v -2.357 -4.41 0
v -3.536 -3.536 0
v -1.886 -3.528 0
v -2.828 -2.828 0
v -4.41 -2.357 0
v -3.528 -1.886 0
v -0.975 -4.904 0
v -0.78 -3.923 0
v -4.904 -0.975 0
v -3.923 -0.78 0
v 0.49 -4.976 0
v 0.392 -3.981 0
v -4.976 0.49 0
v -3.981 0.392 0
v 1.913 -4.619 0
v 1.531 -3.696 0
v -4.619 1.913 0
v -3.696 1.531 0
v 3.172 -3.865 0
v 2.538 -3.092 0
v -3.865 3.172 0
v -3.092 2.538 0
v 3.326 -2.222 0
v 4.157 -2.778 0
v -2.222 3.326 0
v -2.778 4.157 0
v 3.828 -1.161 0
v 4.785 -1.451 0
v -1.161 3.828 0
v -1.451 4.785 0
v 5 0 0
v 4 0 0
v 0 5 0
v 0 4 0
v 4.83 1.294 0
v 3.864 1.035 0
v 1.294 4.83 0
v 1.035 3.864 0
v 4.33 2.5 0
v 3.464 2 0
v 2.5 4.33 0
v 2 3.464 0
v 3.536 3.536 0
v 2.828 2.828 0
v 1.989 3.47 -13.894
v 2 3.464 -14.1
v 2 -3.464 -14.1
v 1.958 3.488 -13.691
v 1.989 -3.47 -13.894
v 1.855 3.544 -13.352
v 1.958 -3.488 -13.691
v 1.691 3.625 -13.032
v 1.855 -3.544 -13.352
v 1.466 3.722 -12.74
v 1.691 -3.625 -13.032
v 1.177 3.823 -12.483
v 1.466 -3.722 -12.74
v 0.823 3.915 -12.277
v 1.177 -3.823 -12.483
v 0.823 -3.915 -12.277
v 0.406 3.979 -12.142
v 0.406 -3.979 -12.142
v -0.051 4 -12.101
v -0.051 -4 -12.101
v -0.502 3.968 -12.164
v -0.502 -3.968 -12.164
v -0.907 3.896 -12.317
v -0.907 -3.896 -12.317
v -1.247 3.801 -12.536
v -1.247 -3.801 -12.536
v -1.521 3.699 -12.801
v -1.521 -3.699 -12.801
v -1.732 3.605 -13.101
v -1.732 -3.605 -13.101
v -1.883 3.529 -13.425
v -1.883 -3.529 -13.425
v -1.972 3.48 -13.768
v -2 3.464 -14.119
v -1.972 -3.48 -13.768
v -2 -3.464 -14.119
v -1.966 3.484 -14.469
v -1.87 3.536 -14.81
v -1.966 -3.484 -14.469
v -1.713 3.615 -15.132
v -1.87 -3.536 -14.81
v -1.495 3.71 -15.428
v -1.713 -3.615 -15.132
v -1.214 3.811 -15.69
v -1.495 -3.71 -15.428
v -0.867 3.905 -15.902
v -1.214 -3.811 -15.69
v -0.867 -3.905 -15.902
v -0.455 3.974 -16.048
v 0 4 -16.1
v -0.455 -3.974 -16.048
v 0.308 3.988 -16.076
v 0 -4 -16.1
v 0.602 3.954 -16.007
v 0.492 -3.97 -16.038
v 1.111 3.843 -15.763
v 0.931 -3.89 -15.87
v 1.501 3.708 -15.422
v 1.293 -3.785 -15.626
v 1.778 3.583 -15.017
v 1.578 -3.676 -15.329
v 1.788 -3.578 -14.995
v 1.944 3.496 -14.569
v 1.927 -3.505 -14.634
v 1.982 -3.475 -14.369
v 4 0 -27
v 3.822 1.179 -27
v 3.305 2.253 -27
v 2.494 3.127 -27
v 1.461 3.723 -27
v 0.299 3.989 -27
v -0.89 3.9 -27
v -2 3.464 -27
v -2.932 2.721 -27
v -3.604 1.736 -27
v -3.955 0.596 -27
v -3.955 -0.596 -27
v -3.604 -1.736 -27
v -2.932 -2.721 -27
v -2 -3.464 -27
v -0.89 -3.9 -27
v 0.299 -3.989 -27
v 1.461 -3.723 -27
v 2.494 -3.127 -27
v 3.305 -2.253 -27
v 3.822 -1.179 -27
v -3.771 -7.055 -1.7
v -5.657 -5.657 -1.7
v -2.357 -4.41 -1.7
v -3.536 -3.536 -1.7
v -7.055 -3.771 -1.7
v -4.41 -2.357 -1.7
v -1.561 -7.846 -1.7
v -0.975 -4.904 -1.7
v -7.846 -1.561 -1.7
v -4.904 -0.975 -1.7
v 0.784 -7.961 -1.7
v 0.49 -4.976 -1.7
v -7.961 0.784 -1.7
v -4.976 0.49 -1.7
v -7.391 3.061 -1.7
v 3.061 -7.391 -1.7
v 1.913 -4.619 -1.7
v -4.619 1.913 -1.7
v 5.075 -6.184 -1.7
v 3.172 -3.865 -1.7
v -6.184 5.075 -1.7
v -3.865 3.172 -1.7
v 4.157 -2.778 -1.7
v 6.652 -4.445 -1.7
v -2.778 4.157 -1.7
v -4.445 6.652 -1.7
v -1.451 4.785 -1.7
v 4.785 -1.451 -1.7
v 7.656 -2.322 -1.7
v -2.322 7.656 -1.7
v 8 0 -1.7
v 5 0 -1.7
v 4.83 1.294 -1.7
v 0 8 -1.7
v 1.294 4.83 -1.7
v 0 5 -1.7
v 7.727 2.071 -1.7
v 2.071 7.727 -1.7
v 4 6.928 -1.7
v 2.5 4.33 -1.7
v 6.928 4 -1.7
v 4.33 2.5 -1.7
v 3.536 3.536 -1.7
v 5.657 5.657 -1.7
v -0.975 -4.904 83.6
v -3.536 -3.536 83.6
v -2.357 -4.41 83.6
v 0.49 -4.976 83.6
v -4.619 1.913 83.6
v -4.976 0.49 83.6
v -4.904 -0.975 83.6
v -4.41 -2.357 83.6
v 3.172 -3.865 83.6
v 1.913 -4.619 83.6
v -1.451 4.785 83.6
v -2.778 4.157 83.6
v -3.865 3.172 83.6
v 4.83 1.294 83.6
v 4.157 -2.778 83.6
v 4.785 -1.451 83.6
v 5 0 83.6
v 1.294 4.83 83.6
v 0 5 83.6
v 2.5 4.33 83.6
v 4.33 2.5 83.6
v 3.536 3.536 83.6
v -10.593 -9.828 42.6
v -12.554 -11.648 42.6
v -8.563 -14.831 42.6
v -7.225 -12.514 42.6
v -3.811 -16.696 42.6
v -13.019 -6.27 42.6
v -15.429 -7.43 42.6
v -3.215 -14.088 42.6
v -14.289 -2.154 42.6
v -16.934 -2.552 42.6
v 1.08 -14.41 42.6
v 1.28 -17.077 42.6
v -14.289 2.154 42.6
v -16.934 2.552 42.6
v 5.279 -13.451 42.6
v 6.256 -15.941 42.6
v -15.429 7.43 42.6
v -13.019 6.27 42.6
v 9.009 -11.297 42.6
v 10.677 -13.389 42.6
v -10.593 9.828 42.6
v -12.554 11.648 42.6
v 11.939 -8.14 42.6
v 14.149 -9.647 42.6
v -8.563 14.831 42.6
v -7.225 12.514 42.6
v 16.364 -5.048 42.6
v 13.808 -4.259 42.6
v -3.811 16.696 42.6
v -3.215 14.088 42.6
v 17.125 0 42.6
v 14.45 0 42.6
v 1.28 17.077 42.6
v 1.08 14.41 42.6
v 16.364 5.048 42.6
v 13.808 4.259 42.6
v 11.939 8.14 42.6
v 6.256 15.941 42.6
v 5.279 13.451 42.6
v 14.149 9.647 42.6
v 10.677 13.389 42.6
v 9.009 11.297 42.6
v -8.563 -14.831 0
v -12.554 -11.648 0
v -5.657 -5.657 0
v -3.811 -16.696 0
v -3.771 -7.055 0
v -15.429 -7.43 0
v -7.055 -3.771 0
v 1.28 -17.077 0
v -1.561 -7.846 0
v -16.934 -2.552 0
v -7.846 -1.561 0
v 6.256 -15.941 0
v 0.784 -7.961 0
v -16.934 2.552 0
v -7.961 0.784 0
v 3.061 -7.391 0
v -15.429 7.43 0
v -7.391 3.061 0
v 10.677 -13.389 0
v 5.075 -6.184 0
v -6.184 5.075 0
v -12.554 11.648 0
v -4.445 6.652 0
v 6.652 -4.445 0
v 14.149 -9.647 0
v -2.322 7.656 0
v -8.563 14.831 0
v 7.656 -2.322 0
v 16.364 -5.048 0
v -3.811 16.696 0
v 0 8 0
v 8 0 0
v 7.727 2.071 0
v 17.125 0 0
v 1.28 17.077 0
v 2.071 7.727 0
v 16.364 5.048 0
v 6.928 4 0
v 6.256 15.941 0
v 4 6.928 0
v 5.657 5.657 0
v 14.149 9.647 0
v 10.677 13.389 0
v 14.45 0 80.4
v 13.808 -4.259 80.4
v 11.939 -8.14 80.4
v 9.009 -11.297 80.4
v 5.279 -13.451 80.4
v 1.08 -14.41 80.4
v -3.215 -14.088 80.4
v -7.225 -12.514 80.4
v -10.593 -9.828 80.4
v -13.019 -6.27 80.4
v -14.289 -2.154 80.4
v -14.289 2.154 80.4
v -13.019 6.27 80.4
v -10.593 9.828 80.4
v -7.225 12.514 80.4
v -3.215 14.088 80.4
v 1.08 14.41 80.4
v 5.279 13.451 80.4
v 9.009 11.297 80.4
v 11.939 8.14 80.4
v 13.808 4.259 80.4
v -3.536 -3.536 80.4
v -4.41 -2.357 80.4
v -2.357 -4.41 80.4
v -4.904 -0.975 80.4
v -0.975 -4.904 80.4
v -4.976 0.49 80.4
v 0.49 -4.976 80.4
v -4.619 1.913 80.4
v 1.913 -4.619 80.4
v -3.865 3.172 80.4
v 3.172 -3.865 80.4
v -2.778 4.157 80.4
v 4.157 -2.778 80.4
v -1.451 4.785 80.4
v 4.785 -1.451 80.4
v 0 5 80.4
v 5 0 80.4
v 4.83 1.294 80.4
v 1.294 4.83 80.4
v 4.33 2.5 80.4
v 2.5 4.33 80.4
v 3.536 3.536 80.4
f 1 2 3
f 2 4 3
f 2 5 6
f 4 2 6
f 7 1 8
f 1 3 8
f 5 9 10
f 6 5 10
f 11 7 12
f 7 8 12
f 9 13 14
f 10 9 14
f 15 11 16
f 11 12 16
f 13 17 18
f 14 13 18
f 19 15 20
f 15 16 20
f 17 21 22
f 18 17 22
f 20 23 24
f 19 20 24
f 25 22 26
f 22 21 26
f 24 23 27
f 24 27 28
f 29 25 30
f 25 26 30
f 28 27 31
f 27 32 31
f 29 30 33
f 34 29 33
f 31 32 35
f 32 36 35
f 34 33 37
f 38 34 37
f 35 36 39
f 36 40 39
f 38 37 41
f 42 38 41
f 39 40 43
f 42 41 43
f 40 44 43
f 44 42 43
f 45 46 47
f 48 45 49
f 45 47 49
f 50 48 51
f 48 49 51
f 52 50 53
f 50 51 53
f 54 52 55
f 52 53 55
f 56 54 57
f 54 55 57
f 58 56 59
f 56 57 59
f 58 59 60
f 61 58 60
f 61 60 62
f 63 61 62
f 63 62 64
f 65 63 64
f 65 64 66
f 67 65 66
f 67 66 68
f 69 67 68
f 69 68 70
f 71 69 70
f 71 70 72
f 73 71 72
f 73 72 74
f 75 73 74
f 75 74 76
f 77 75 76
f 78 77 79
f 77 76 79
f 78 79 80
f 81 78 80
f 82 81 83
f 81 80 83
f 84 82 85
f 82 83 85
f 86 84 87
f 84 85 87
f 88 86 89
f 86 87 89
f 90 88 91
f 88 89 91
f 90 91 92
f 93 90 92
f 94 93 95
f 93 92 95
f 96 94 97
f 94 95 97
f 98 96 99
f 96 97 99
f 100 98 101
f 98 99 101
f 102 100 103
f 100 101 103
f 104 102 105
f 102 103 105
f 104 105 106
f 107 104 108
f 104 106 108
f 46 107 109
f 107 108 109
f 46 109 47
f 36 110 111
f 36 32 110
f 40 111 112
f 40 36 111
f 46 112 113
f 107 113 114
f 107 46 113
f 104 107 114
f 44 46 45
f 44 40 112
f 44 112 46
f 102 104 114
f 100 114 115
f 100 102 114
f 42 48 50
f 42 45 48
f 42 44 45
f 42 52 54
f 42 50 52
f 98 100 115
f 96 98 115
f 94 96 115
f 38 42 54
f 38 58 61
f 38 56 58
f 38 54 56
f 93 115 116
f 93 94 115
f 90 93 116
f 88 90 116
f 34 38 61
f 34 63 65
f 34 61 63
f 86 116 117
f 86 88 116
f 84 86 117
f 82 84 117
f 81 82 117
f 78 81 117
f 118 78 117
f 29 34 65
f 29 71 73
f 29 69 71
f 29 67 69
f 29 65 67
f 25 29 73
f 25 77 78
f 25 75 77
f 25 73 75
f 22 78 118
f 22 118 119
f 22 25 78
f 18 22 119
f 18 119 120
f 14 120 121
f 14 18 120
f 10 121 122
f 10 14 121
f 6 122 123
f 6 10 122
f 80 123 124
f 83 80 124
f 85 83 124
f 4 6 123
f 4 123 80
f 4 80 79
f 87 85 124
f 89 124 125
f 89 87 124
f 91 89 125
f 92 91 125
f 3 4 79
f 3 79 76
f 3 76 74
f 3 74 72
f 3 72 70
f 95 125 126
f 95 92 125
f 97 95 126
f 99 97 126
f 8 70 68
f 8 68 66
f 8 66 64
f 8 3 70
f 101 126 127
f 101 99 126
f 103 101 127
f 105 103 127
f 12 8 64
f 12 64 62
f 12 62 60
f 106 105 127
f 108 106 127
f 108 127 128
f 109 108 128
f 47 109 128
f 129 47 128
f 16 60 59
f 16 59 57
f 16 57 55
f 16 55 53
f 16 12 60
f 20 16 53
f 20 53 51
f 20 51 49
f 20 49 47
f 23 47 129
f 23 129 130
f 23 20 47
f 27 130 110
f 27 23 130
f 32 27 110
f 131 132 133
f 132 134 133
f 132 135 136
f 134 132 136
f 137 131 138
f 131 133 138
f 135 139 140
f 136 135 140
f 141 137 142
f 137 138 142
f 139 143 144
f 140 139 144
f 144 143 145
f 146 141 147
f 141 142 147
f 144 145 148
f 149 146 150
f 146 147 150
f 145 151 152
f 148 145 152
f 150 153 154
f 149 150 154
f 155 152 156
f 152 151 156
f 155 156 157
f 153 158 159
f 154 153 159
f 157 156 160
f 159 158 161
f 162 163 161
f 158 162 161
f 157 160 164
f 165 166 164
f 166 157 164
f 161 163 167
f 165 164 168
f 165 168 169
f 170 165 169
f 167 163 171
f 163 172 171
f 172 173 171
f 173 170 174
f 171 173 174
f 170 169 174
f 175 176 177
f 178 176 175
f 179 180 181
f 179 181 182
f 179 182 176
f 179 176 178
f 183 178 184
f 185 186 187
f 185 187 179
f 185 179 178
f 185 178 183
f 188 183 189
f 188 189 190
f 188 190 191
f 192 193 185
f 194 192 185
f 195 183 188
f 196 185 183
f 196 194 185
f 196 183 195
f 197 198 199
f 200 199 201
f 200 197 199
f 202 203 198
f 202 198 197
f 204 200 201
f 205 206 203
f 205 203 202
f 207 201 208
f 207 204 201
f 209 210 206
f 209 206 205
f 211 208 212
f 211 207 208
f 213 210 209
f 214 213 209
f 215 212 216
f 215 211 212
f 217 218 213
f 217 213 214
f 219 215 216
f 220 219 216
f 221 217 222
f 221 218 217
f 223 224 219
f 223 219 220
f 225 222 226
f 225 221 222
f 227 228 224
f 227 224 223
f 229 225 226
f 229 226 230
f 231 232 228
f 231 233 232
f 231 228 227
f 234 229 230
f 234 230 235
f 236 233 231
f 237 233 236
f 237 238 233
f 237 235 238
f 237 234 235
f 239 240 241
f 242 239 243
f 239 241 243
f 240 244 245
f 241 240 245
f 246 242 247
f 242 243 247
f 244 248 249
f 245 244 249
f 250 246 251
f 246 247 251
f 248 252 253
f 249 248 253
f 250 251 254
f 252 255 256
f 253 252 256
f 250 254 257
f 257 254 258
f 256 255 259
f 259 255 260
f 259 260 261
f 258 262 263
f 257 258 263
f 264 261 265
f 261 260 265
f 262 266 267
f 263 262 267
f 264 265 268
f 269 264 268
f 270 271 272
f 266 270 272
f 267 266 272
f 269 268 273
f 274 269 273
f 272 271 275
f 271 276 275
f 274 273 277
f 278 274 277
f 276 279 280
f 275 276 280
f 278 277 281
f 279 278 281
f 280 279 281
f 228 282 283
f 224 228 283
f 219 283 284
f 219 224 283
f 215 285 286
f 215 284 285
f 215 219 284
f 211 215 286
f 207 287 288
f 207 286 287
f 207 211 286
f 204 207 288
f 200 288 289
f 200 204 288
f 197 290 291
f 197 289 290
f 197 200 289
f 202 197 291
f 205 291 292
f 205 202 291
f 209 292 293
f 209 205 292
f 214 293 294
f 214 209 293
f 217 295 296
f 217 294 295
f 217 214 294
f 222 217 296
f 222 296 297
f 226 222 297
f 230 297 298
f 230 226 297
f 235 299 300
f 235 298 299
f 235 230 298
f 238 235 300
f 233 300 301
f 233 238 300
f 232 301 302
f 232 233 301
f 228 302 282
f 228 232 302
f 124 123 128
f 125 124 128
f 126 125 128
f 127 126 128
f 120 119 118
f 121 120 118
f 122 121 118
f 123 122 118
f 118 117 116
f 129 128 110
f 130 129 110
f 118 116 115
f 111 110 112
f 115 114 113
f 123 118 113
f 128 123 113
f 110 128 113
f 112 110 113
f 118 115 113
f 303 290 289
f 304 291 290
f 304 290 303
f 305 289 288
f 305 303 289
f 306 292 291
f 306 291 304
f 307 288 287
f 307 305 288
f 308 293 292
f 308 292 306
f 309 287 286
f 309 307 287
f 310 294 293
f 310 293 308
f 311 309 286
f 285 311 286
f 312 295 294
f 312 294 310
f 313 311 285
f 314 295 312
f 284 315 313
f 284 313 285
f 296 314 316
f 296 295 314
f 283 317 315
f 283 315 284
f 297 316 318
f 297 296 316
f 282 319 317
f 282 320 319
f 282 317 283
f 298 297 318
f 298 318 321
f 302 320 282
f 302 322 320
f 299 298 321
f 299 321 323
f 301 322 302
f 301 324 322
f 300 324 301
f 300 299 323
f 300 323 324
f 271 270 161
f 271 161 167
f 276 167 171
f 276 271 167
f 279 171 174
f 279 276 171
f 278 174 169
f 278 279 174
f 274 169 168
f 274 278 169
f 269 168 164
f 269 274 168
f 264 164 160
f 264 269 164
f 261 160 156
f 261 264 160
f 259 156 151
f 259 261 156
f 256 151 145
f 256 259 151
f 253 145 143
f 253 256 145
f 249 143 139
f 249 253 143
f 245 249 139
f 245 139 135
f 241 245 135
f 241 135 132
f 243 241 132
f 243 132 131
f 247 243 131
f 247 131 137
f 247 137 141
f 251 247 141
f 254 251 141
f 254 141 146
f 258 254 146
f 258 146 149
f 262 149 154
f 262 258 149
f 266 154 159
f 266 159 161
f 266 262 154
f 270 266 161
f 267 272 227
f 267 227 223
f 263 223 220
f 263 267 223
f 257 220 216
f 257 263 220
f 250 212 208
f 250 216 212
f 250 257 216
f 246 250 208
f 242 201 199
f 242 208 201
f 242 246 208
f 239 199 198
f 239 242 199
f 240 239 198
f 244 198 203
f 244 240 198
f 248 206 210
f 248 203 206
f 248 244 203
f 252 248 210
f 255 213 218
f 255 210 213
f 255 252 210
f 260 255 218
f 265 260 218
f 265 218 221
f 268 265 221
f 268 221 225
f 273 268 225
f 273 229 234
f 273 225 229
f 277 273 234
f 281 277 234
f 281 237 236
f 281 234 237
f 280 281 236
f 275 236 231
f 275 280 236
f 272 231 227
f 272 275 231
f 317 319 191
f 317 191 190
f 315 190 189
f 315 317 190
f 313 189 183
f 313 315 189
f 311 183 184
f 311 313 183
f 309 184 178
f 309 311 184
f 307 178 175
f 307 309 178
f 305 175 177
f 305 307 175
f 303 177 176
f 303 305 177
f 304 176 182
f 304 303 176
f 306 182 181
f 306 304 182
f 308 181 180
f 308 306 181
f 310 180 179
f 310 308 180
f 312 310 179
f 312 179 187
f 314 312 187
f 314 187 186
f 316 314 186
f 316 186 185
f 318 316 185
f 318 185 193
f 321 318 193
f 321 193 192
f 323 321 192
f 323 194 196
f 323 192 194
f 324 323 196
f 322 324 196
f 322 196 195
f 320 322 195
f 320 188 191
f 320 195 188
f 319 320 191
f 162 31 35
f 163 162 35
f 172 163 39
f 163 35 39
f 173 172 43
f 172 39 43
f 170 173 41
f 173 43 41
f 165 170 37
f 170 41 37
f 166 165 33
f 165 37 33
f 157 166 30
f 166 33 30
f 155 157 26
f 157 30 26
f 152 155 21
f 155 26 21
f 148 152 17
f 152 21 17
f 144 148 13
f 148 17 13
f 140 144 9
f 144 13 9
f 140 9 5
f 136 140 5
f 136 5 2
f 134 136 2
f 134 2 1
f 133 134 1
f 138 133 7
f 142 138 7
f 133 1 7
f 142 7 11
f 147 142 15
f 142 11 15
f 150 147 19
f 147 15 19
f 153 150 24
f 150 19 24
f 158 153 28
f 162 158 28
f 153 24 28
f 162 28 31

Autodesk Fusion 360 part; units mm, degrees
sketch "Boceto1" plane through (0, 0, 0) normal (0, 0, 1) x (1, 0, 0)
  circle A0 centre (0, 0) radius 14.45
  circle A1 centre (0, 0) radius 17.125
  circle A2 centre (0, 0) radius 4
  circle A3 centre (0, 0) radius 5
  circle A4 centre (0, 0) radius 8
  line L0 (0, 0) -> (0, 11.225)
  circle A5 centre (0, 11.225) radius 1.5
  circle A6 centre (-11.225, 0) radius 1.5
  circle A7 centre (0, -11.225) radius 1.5
  circle A8 centre (11.225, 0) radius 1.5
  dimension "d1" = 28.9
  dimension "d2" = 34.25
  dimension "d7" = 8
  dimension "d8" = 10
  dimension "d13" = 16
  dimension "d22" = 11.225
  dimension "d23" = 3
  dimension "d25" = 360
extrude "Extruir1" add sketch "Boceto1" along normal blind 80.4 contours A0 | A2 | A3 | A4 | A5 | A6 | A7 | A8
extrude "Extruir2" add sketch "Boceto1" along normal blind 42.6 contours A1
extrude "Extruir3" add sketch "Boceto1" along normal blind 83.6 contours A2 | A3
extrude "Extruir4" add sketch "Boceto1" against normal blind 27 contours A2
extrude "Extruir5" add sketch "Boceto1" against normal blind 1.7 contours A4
sketch "Boceto2" plane through (0, 0, 0) normal (0, 1, 0) x (1, 0, 0)
  line L0 (4, 27) -> (4, 2.5)
  line L1 (-4, 2.5) -> (-4, 27)
  line L2 (4, 27) -> (-4, 27)
  line L3 (4, 27) -> (-4, 27)
  line L4 (-4, 0) -> (4, 0)
  line L5 (4, 27) -> (-4, 27)
  line L6 (0, 27) -> (0, 16.1)
  line L7 (0, 16.1) -> (0, 14.1)
  circle A0 centre (0, 14.1) radius 2
  dimension "d26" = 10.9
  dimension "d27" = 2
  dimension "d28" = 4
extrude "Extruir7" cut sketch "Boceto2" along normal mid plane 14
